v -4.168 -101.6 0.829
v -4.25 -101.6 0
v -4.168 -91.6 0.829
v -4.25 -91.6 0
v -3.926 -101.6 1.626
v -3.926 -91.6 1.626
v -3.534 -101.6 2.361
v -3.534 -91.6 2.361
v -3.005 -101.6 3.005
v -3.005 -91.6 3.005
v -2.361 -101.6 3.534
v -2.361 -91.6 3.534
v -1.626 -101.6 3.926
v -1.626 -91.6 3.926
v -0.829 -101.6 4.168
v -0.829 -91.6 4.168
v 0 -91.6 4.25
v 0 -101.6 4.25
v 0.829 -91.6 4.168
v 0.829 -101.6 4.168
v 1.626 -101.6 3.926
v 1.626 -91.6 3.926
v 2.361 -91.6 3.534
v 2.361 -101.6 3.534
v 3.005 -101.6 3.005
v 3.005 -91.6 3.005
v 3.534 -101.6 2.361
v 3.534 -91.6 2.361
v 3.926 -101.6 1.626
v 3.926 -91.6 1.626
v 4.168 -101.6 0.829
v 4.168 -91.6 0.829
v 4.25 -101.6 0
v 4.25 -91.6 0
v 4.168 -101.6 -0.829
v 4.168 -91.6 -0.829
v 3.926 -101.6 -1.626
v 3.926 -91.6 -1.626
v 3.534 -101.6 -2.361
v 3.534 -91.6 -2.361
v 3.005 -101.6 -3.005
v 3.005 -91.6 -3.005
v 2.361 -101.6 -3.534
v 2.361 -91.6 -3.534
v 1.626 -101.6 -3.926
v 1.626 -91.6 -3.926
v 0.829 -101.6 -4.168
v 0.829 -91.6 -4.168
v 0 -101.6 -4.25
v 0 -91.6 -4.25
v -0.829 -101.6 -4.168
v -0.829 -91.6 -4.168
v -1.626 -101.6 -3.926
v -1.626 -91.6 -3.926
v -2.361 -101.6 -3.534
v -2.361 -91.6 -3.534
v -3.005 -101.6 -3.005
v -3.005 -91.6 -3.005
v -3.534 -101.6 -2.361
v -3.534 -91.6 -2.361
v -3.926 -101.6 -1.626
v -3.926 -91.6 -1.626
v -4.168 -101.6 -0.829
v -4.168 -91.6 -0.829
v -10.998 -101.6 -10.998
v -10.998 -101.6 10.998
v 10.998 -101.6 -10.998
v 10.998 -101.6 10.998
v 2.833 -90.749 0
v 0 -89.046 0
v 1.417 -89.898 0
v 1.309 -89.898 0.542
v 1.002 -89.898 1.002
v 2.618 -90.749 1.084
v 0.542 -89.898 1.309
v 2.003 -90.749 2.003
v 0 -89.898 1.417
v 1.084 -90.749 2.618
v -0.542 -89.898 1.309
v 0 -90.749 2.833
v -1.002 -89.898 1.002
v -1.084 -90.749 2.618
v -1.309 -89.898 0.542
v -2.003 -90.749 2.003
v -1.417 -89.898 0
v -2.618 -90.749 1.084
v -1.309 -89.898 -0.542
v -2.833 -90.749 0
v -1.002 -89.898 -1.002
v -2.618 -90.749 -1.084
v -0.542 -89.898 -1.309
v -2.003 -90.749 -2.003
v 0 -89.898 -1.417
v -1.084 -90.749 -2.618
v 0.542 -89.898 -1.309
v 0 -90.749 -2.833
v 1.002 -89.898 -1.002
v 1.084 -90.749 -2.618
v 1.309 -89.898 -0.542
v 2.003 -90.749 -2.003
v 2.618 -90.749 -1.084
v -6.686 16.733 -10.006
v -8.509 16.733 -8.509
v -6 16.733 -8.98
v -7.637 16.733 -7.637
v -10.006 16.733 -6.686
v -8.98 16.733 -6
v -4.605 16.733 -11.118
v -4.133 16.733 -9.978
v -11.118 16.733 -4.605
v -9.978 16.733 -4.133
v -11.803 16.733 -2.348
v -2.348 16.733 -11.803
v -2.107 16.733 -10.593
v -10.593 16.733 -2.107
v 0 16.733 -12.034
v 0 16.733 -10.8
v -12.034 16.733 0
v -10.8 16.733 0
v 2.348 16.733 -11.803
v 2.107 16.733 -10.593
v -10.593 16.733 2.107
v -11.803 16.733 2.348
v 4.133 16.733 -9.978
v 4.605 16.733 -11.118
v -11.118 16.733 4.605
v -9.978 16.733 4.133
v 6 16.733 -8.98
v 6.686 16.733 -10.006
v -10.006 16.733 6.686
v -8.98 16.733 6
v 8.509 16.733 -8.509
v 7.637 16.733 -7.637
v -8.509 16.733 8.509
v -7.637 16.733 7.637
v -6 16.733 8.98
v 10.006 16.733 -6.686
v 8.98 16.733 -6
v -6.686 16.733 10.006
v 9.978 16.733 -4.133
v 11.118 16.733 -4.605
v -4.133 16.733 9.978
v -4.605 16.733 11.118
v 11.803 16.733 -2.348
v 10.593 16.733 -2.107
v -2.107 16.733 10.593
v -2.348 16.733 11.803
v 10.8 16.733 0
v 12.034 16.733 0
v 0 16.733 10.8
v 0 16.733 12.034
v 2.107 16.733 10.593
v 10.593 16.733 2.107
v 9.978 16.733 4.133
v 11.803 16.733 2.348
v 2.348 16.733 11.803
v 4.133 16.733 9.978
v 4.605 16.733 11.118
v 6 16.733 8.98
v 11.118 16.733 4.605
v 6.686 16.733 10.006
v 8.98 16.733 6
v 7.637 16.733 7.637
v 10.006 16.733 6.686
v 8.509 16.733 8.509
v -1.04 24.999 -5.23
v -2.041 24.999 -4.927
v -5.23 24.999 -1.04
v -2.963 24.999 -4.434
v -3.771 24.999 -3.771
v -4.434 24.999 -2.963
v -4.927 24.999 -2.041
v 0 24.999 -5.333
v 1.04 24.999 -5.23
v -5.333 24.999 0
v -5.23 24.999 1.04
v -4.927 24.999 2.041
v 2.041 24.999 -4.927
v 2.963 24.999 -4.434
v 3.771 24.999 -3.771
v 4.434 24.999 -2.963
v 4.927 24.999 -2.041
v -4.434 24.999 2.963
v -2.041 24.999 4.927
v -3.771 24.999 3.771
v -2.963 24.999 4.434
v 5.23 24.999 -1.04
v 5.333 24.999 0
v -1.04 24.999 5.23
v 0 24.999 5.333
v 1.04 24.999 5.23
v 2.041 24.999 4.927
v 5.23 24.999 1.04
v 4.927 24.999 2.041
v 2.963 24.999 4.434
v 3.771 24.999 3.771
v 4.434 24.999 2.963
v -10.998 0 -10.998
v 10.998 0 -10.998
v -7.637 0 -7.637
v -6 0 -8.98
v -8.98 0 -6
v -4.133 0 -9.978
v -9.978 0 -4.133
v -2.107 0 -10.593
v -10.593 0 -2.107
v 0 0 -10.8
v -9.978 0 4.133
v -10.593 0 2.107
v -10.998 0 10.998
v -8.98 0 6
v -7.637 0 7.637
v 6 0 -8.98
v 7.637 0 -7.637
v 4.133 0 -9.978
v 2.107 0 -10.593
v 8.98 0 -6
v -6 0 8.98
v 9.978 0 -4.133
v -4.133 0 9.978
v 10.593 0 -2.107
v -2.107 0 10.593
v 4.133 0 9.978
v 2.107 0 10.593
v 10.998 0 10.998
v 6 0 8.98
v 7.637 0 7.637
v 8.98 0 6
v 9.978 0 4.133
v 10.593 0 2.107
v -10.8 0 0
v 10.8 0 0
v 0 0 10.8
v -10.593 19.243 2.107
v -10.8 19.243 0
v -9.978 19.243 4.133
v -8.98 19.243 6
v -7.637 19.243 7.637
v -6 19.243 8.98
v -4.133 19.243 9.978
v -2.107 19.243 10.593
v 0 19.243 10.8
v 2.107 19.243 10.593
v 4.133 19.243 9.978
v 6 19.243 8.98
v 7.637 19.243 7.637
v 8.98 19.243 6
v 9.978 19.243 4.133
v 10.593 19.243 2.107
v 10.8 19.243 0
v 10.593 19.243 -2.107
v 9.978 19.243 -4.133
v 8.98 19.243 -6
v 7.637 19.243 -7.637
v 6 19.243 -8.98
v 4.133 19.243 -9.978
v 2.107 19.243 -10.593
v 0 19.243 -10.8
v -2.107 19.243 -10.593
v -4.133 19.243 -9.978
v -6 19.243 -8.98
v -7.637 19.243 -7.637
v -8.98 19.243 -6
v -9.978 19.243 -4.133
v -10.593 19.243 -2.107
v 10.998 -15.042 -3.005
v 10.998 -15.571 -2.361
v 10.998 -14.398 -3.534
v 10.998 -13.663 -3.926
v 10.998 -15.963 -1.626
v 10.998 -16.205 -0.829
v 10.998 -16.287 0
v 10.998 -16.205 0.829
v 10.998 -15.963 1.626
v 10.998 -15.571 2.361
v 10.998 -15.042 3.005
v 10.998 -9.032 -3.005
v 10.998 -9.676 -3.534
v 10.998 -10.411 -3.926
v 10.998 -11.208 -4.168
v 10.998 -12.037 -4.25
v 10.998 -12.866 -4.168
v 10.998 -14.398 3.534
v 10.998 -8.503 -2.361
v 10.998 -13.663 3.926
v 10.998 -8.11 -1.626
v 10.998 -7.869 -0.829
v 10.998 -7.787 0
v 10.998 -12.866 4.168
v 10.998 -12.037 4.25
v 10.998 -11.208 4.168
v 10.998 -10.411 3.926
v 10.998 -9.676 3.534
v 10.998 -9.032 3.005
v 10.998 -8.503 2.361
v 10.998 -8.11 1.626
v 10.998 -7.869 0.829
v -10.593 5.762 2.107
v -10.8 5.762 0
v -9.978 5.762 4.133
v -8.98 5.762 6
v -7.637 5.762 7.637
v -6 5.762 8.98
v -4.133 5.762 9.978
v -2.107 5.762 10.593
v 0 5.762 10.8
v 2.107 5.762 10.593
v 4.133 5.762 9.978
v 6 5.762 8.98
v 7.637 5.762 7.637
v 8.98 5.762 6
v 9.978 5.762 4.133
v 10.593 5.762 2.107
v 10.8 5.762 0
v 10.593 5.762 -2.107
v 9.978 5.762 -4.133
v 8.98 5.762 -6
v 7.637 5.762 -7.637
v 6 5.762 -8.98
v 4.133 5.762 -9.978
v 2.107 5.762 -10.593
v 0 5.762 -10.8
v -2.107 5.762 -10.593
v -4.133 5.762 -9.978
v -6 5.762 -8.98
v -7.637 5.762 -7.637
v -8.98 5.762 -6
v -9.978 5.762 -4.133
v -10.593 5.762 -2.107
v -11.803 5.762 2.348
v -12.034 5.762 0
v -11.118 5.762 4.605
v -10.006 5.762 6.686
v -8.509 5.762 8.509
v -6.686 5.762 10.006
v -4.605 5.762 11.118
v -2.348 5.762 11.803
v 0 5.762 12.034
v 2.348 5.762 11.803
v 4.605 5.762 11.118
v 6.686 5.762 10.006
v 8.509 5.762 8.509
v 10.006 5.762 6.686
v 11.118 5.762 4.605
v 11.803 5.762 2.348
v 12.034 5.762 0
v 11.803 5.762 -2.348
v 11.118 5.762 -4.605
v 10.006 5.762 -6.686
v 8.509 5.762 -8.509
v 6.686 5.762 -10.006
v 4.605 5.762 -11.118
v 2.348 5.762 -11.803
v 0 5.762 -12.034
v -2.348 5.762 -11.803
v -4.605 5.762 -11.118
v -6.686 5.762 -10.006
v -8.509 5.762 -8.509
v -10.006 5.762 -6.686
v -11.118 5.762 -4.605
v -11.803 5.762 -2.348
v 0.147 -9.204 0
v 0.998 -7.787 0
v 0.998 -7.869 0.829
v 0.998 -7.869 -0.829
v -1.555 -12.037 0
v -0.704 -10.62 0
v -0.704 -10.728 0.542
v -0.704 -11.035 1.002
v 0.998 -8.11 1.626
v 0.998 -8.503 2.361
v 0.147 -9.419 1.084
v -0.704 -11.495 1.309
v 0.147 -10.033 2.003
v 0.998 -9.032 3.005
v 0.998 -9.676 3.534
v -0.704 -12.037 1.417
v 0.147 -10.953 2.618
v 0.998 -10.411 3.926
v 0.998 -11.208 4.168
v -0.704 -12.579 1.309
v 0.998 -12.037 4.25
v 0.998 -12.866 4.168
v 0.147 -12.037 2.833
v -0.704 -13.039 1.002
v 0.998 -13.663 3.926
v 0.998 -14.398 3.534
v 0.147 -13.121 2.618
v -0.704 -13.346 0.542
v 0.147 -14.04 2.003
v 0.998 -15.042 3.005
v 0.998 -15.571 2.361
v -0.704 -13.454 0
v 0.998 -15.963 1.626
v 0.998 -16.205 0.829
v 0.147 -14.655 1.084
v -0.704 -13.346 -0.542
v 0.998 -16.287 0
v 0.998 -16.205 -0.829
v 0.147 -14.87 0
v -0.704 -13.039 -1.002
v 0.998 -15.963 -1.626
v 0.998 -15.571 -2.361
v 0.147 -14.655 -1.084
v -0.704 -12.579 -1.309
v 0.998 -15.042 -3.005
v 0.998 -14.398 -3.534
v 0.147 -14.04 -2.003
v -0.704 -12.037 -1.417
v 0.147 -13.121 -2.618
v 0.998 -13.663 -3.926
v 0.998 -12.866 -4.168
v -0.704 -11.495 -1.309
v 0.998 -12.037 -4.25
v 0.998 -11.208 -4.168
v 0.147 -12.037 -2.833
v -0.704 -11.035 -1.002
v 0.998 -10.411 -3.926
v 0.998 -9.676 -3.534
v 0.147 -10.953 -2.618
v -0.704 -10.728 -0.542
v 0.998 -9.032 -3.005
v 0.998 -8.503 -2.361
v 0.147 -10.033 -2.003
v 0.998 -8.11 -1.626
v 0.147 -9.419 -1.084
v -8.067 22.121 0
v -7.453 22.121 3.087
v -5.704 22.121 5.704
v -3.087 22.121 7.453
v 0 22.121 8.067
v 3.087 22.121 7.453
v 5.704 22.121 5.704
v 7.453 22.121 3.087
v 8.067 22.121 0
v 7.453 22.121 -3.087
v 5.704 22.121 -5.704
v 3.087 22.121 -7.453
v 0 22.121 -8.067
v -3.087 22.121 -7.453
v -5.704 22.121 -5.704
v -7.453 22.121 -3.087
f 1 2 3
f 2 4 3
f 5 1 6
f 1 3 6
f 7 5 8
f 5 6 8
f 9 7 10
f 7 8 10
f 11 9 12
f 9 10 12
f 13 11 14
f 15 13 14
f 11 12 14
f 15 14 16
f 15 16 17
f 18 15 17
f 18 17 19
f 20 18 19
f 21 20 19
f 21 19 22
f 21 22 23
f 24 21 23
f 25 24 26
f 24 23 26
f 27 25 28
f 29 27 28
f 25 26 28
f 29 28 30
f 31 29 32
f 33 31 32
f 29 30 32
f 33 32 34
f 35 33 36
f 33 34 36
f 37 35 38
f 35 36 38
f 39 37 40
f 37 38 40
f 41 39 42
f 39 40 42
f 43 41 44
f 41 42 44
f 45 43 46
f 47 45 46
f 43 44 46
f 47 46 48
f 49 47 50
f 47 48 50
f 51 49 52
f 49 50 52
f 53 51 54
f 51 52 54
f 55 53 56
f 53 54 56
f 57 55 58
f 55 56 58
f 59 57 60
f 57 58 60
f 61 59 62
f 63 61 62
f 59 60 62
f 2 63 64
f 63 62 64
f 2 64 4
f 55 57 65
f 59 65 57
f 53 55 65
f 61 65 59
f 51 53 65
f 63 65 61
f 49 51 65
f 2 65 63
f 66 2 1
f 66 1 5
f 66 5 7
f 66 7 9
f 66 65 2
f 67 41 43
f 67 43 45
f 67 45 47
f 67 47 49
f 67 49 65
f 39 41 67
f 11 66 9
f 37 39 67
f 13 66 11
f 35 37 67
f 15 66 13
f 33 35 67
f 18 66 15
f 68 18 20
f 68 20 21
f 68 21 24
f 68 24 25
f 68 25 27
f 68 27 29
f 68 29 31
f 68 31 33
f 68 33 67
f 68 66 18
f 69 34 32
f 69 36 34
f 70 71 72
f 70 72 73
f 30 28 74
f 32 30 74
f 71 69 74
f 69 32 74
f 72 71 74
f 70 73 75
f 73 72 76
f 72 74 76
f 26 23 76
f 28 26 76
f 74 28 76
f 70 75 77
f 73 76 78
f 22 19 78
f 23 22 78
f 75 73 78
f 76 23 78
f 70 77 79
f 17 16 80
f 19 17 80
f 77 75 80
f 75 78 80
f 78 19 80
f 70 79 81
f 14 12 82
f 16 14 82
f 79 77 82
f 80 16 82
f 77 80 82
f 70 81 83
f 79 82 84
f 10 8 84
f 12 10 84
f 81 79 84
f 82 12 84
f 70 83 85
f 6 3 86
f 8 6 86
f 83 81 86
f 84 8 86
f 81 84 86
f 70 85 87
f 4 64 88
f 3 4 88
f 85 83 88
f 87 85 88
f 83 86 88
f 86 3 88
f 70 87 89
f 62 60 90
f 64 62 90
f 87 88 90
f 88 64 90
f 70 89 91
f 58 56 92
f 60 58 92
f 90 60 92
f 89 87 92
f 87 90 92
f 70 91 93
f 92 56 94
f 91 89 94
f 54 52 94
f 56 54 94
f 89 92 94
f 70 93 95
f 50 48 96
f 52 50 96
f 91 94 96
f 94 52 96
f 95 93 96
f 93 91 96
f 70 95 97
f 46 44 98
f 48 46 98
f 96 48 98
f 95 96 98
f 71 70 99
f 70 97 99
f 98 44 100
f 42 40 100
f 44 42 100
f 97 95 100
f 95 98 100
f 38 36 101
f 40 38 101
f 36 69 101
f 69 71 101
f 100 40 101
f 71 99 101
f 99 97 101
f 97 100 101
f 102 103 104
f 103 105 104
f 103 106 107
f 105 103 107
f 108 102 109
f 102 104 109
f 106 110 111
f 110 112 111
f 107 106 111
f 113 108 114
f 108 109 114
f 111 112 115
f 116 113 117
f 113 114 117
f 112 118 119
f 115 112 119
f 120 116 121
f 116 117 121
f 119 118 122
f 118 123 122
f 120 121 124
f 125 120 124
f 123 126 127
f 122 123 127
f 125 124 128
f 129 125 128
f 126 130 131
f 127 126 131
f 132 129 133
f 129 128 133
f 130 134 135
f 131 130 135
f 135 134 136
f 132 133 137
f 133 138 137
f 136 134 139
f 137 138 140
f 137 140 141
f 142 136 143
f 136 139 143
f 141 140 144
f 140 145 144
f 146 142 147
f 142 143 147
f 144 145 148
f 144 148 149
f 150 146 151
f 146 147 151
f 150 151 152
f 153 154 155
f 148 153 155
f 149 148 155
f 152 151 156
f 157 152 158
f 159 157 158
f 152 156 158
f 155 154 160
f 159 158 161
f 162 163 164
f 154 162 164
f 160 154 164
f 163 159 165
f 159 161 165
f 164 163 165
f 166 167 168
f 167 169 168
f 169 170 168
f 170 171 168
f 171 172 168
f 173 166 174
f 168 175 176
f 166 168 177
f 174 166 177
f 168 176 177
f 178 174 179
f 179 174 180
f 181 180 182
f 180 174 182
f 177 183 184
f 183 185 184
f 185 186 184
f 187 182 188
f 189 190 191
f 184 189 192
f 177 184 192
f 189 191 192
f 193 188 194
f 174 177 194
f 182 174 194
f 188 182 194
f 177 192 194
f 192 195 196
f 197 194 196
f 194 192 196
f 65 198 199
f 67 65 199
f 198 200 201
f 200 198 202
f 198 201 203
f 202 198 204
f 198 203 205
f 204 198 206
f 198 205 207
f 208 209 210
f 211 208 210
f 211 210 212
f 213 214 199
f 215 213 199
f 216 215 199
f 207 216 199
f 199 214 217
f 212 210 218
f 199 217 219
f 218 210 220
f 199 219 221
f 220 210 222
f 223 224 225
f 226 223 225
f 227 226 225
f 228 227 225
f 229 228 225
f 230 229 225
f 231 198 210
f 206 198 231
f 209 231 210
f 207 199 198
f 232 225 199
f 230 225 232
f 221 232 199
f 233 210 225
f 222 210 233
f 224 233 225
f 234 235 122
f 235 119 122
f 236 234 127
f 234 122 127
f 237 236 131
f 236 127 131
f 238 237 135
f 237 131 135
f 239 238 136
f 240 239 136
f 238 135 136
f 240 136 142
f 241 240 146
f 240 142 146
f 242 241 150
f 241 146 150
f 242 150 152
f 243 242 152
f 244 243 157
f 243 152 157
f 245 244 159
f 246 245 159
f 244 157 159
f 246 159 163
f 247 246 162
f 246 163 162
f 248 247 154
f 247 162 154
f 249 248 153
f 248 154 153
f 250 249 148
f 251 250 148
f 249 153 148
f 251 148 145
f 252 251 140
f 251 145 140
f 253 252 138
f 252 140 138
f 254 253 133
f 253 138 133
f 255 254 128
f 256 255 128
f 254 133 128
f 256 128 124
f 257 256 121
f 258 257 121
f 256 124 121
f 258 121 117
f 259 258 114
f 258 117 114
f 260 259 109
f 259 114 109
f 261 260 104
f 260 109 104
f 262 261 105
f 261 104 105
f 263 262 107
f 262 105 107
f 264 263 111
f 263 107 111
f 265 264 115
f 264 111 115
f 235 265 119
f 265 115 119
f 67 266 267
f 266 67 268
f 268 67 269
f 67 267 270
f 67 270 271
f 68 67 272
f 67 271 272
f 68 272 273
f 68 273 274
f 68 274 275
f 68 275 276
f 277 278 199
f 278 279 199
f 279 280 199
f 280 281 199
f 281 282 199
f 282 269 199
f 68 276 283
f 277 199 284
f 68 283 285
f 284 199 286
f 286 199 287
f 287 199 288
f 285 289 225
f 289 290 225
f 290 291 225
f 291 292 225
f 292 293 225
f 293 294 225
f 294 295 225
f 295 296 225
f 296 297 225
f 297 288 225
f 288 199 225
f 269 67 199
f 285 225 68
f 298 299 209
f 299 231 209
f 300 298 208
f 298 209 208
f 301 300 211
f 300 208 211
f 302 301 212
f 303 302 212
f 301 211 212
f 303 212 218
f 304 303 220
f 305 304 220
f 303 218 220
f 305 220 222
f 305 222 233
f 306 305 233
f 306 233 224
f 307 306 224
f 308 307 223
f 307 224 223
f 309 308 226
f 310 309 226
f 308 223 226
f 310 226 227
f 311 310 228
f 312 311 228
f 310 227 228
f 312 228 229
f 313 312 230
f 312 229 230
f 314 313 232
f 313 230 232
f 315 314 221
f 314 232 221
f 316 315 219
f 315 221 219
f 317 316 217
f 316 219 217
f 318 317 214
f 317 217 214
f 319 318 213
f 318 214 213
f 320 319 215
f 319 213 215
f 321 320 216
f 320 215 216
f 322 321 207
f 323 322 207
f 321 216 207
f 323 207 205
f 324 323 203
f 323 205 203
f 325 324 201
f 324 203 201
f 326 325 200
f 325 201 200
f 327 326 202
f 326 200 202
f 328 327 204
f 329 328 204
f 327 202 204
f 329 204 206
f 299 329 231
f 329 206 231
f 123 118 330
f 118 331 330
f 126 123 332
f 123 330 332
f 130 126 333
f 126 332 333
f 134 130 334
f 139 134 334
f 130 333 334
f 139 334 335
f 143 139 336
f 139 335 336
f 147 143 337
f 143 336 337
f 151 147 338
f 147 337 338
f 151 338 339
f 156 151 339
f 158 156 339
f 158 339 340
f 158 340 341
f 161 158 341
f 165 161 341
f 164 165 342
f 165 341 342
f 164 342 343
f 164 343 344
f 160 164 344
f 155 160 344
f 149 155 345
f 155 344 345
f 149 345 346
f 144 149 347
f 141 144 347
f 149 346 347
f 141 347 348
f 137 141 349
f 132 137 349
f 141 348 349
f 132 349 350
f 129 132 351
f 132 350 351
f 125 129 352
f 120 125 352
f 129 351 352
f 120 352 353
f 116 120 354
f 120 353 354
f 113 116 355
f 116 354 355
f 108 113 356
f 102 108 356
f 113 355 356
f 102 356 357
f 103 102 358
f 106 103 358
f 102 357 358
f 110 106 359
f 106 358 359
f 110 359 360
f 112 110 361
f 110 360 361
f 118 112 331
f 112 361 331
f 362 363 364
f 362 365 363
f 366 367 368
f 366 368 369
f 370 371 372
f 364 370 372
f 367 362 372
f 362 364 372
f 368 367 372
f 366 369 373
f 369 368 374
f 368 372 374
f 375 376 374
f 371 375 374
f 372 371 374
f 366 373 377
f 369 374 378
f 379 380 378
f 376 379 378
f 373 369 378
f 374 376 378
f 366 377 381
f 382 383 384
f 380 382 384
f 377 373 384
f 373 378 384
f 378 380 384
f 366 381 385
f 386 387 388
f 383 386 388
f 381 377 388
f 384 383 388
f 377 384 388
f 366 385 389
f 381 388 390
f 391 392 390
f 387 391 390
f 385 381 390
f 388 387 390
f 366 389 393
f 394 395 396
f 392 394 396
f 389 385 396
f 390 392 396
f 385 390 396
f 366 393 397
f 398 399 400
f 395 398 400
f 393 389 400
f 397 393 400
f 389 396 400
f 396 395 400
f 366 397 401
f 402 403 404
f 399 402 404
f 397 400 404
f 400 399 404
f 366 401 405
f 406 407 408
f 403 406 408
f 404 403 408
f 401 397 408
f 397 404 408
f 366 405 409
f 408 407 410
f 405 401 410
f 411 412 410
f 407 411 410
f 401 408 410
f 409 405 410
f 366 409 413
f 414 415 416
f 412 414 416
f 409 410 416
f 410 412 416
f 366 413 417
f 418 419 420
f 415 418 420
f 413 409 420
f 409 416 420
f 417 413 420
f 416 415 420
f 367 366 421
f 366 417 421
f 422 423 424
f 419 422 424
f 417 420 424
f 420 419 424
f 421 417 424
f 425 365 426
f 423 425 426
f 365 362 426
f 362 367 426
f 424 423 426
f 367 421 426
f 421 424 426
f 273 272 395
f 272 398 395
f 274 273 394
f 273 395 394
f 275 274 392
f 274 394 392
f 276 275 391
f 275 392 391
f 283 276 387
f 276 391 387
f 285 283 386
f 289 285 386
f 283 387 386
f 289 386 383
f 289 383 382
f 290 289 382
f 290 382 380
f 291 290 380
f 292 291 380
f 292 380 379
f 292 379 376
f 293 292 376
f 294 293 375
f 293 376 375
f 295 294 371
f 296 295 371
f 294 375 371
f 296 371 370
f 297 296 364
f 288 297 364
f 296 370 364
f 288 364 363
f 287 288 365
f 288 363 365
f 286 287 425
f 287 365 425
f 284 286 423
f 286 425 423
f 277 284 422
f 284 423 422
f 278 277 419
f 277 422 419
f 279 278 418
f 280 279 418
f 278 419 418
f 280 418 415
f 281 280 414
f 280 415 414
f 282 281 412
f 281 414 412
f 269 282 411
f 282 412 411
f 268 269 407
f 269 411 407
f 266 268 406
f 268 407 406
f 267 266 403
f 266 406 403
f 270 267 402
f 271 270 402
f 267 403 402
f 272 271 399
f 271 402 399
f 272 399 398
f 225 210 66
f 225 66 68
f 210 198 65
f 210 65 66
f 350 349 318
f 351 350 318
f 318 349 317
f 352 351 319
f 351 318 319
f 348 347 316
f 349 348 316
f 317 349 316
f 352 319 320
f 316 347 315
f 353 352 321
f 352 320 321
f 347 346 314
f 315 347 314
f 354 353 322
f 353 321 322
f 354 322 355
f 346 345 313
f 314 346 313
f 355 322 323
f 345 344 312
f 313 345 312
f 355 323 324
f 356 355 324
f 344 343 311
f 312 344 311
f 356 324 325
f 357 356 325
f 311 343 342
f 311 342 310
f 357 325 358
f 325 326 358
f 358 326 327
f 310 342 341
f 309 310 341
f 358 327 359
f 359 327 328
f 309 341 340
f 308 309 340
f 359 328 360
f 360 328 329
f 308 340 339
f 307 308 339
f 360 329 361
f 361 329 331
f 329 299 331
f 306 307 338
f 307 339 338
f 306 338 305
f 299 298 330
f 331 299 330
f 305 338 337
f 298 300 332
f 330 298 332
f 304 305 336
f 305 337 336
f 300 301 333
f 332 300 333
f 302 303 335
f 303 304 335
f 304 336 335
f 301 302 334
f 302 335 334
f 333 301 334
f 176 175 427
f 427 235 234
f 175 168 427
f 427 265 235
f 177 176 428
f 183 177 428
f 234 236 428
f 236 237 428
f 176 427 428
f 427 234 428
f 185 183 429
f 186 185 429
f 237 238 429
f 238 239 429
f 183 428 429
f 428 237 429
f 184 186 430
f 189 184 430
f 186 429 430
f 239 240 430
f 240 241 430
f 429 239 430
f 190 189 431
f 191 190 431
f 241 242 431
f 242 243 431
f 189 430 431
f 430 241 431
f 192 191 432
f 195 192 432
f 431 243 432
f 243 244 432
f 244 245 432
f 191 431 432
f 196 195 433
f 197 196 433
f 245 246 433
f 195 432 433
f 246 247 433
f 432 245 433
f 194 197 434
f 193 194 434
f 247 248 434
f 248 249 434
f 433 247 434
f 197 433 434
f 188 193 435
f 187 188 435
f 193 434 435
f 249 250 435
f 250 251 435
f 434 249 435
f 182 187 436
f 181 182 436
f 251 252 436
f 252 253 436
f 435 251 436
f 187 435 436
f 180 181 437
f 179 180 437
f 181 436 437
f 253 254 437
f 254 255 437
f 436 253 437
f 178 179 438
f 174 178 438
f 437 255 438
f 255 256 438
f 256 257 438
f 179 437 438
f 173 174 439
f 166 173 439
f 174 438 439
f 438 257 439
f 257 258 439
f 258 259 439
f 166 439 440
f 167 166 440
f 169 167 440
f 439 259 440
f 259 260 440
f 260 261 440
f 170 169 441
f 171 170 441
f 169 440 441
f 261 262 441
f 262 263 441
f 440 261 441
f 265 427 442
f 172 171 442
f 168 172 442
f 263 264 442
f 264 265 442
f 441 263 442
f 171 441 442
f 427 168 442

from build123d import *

# Parameters (mm, degrees)
F0_W     = 21.9964
F0_H     = 21.9964
F1_DEPTH = 101.6
F5_D     = 8.5
F5_DEPTH = 10
F5_TIP   = 2.5536576309
F7_D     = 8.5
F7_DEPTH = 10
F7_TIP   = 2.5536576309


with BuildPart() as f1:
    # F0 (on Front) → F1 (new body)
    with BuildSketch(Plane.XZ):
        Rectangle(F0_W, F0_H)
    extrude(amount=F1_DEPTH)

    # F2 (on Top) → F3 (revolve)
    with BuildSketch(Plane.XY):
        Polygon((-10.800095275, 0), (0, 0), (0, 24.9989666045), (-5.3329677321, 24.9989666045), (-10.800095275, 19.2432253866), (-10.800095275, 16.7330801487), (-12.0340296999, 16.7330801487), (-12.0340296999, 5.7621949818), (-10.800095275, 5.7621949818), align=None)
    revolve(axis=Axis((0, 12.4994833022, 0), (0, 1, 0)))

    # F5
    with Locations(Plane.YZ.offset(10.9982)):
        with Locations((-12.036957778, 0)):
            Hole(F5_D / 2, depth=F5_DEPTH)
            with Locations((0, 0, -(F5_DEPTH + F5_TIP / 2))):  # 118° drill point
                Cone(0, F5_D / 2, F5_TIP, mode=Mode.SUBTRACT)

    # F7
    with Locations(Plane.XZ.offset(101.6)):
        with Locations((0, 0)):
            Hole(F7_D / 2, depth=F7_DEPTH)
            with Locations((0, 0, -(F7_DEPTH + F7_TIP / 2))):  # 118° drill point
                Cone(0, F7_D / 2, F7_TIP, mode=Mode.SUBTRACT)


solid = f1.part
